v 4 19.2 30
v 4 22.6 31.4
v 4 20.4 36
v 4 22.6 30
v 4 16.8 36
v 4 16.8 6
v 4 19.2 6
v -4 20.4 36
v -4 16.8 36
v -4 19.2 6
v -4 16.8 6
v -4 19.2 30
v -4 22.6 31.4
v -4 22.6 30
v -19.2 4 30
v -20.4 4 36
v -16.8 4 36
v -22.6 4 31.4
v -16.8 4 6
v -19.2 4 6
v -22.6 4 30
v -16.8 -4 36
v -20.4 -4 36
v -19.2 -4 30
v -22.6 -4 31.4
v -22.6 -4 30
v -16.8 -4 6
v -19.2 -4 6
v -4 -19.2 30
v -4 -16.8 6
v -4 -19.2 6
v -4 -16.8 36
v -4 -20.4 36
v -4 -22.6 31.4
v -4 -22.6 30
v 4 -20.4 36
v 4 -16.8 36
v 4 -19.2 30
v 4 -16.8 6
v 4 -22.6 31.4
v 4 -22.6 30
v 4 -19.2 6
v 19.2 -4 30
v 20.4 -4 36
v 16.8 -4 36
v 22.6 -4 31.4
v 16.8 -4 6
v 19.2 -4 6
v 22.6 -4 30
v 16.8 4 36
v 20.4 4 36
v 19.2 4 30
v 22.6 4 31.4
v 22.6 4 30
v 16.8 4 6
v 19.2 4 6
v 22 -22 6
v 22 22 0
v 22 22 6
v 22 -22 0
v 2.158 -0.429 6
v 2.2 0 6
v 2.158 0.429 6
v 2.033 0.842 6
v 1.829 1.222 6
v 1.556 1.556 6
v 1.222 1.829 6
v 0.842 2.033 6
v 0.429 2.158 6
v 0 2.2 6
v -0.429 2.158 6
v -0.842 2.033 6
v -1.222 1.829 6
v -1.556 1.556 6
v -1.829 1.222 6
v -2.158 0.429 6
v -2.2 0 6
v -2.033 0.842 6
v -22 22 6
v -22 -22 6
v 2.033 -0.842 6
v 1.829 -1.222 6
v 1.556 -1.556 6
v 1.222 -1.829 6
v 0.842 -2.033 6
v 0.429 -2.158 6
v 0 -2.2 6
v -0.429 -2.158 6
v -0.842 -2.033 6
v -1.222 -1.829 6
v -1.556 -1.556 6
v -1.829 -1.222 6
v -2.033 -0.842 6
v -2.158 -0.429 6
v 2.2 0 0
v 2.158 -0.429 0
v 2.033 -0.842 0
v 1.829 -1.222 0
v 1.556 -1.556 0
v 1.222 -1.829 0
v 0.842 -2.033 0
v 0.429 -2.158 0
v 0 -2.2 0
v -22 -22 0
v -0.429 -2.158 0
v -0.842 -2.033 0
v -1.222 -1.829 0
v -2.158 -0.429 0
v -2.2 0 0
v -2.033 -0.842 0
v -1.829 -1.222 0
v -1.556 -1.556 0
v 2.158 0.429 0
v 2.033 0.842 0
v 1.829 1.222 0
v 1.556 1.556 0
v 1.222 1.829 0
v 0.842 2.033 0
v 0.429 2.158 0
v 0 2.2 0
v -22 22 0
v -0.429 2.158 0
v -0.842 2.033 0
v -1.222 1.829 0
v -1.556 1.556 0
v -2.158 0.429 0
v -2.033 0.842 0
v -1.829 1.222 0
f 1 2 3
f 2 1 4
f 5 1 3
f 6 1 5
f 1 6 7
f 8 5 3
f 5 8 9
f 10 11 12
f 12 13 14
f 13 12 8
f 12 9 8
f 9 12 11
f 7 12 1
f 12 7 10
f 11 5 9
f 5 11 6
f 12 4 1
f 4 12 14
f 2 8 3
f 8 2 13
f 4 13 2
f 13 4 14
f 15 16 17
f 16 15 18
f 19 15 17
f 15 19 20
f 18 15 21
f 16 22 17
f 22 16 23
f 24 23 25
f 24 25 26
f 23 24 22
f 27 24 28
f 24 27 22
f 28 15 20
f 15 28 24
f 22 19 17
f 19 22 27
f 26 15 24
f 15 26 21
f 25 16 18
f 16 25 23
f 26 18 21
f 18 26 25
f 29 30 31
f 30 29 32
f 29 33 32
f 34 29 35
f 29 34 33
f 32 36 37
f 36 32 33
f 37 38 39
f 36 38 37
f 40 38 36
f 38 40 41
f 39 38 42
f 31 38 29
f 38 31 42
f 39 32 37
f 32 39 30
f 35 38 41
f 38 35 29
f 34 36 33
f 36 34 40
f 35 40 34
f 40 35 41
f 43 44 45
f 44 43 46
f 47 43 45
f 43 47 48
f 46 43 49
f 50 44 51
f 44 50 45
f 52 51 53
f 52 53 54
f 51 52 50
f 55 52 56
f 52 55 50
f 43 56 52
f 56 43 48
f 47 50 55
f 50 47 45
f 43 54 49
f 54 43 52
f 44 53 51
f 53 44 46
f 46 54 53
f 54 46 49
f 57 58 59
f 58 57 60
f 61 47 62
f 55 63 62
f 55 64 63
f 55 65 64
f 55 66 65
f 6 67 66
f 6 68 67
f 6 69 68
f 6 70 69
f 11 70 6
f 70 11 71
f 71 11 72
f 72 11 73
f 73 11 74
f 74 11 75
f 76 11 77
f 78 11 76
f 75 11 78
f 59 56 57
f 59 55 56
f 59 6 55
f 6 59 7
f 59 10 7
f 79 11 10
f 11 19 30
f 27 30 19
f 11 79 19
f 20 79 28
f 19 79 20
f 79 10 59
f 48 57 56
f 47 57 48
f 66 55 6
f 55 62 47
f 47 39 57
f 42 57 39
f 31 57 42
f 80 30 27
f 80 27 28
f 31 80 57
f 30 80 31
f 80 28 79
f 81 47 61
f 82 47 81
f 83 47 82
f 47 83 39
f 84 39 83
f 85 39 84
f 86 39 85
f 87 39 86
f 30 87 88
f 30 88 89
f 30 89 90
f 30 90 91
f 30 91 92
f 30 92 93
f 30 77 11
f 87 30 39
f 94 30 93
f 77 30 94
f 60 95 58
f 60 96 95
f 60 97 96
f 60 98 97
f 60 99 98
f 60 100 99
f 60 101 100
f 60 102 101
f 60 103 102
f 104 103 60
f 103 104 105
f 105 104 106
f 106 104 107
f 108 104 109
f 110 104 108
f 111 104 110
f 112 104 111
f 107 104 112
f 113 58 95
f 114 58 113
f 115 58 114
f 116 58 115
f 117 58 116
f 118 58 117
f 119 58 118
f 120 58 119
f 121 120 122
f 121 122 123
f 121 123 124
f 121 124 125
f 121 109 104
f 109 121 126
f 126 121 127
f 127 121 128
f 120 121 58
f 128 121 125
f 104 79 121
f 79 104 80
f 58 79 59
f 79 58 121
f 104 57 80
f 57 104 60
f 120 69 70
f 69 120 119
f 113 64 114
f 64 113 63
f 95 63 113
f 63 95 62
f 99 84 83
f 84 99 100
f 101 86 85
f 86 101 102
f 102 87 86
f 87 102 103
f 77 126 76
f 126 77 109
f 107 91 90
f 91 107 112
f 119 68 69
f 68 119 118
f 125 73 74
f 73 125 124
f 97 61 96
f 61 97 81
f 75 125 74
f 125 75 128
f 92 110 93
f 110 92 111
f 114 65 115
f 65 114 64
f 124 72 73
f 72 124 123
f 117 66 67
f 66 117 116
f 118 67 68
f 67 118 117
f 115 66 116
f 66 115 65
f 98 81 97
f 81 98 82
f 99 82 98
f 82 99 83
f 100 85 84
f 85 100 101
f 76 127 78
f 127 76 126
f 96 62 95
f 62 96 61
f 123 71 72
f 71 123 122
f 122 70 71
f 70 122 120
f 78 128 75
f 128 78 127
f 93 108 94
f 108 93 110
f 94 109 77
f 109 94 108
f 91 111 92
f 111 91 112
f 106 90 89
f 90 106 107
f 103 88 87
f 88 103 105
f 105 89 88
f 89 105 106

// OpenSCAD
$fn = 32;

// ----------------------------------------------------------------------
// Snap-fit latch: 4 arms, 30 mm tall, 3.6 mm undercut hooks
// ----------------------------------------------------------------------

// --- parameters (mm) ---
base_d = 44;              // base plate depth
base_h = 6;               // base plate thickness
span = 36;                // distance between opposite arms
arm_t = 2.4;              // arm thickness
arm_d = 8;                // arm width
height = 30;              // free arm length
head_len = 3.6;           // hook reach
head_h = 6;               // hook height
lead = 1.4;               // lead-in ramp thickness
bore_d = 4.4;             // base fixing bore
top_z = 36;               // height of the arm tips above the base

arms = 4;

difference() {
  union() {
    /* base plate, centred on the arm ring */
    translate([-22, -22, 0]) cube([base_d, base_d, base_h]);
    for (a = [0 : 360 / arms : 359]) rotate([0, 0, a]) {
    /* arm, sunk 0.5 mm into the base */
    translate([-arm_d / 2, span / 2 - arm_t / 2, base_h - 0.5]) cube([arm_d, arm_t, height + 0.5]);
    /* hook: a convex hull of a tall inner block and a thin outer lip
       gives a flat undercut below and a lead-in ramp on top */
    hull() {
      translate([-arm_d / 2, span / 2 + arm_t / 2 - 0.6, top_z - head_h]) cube([arm_d, lead + 0.4, head_h]);
      translate([-arm_d / 2, span / 2 + arm_t / 2 - 0.2, top_z - head_h]) cube([arm_d, head_len, lead]);
    }
    }
  }
  translate([0, 0, -2.5]) cylinder(h = base_h + 5, d = bore_d);
}
